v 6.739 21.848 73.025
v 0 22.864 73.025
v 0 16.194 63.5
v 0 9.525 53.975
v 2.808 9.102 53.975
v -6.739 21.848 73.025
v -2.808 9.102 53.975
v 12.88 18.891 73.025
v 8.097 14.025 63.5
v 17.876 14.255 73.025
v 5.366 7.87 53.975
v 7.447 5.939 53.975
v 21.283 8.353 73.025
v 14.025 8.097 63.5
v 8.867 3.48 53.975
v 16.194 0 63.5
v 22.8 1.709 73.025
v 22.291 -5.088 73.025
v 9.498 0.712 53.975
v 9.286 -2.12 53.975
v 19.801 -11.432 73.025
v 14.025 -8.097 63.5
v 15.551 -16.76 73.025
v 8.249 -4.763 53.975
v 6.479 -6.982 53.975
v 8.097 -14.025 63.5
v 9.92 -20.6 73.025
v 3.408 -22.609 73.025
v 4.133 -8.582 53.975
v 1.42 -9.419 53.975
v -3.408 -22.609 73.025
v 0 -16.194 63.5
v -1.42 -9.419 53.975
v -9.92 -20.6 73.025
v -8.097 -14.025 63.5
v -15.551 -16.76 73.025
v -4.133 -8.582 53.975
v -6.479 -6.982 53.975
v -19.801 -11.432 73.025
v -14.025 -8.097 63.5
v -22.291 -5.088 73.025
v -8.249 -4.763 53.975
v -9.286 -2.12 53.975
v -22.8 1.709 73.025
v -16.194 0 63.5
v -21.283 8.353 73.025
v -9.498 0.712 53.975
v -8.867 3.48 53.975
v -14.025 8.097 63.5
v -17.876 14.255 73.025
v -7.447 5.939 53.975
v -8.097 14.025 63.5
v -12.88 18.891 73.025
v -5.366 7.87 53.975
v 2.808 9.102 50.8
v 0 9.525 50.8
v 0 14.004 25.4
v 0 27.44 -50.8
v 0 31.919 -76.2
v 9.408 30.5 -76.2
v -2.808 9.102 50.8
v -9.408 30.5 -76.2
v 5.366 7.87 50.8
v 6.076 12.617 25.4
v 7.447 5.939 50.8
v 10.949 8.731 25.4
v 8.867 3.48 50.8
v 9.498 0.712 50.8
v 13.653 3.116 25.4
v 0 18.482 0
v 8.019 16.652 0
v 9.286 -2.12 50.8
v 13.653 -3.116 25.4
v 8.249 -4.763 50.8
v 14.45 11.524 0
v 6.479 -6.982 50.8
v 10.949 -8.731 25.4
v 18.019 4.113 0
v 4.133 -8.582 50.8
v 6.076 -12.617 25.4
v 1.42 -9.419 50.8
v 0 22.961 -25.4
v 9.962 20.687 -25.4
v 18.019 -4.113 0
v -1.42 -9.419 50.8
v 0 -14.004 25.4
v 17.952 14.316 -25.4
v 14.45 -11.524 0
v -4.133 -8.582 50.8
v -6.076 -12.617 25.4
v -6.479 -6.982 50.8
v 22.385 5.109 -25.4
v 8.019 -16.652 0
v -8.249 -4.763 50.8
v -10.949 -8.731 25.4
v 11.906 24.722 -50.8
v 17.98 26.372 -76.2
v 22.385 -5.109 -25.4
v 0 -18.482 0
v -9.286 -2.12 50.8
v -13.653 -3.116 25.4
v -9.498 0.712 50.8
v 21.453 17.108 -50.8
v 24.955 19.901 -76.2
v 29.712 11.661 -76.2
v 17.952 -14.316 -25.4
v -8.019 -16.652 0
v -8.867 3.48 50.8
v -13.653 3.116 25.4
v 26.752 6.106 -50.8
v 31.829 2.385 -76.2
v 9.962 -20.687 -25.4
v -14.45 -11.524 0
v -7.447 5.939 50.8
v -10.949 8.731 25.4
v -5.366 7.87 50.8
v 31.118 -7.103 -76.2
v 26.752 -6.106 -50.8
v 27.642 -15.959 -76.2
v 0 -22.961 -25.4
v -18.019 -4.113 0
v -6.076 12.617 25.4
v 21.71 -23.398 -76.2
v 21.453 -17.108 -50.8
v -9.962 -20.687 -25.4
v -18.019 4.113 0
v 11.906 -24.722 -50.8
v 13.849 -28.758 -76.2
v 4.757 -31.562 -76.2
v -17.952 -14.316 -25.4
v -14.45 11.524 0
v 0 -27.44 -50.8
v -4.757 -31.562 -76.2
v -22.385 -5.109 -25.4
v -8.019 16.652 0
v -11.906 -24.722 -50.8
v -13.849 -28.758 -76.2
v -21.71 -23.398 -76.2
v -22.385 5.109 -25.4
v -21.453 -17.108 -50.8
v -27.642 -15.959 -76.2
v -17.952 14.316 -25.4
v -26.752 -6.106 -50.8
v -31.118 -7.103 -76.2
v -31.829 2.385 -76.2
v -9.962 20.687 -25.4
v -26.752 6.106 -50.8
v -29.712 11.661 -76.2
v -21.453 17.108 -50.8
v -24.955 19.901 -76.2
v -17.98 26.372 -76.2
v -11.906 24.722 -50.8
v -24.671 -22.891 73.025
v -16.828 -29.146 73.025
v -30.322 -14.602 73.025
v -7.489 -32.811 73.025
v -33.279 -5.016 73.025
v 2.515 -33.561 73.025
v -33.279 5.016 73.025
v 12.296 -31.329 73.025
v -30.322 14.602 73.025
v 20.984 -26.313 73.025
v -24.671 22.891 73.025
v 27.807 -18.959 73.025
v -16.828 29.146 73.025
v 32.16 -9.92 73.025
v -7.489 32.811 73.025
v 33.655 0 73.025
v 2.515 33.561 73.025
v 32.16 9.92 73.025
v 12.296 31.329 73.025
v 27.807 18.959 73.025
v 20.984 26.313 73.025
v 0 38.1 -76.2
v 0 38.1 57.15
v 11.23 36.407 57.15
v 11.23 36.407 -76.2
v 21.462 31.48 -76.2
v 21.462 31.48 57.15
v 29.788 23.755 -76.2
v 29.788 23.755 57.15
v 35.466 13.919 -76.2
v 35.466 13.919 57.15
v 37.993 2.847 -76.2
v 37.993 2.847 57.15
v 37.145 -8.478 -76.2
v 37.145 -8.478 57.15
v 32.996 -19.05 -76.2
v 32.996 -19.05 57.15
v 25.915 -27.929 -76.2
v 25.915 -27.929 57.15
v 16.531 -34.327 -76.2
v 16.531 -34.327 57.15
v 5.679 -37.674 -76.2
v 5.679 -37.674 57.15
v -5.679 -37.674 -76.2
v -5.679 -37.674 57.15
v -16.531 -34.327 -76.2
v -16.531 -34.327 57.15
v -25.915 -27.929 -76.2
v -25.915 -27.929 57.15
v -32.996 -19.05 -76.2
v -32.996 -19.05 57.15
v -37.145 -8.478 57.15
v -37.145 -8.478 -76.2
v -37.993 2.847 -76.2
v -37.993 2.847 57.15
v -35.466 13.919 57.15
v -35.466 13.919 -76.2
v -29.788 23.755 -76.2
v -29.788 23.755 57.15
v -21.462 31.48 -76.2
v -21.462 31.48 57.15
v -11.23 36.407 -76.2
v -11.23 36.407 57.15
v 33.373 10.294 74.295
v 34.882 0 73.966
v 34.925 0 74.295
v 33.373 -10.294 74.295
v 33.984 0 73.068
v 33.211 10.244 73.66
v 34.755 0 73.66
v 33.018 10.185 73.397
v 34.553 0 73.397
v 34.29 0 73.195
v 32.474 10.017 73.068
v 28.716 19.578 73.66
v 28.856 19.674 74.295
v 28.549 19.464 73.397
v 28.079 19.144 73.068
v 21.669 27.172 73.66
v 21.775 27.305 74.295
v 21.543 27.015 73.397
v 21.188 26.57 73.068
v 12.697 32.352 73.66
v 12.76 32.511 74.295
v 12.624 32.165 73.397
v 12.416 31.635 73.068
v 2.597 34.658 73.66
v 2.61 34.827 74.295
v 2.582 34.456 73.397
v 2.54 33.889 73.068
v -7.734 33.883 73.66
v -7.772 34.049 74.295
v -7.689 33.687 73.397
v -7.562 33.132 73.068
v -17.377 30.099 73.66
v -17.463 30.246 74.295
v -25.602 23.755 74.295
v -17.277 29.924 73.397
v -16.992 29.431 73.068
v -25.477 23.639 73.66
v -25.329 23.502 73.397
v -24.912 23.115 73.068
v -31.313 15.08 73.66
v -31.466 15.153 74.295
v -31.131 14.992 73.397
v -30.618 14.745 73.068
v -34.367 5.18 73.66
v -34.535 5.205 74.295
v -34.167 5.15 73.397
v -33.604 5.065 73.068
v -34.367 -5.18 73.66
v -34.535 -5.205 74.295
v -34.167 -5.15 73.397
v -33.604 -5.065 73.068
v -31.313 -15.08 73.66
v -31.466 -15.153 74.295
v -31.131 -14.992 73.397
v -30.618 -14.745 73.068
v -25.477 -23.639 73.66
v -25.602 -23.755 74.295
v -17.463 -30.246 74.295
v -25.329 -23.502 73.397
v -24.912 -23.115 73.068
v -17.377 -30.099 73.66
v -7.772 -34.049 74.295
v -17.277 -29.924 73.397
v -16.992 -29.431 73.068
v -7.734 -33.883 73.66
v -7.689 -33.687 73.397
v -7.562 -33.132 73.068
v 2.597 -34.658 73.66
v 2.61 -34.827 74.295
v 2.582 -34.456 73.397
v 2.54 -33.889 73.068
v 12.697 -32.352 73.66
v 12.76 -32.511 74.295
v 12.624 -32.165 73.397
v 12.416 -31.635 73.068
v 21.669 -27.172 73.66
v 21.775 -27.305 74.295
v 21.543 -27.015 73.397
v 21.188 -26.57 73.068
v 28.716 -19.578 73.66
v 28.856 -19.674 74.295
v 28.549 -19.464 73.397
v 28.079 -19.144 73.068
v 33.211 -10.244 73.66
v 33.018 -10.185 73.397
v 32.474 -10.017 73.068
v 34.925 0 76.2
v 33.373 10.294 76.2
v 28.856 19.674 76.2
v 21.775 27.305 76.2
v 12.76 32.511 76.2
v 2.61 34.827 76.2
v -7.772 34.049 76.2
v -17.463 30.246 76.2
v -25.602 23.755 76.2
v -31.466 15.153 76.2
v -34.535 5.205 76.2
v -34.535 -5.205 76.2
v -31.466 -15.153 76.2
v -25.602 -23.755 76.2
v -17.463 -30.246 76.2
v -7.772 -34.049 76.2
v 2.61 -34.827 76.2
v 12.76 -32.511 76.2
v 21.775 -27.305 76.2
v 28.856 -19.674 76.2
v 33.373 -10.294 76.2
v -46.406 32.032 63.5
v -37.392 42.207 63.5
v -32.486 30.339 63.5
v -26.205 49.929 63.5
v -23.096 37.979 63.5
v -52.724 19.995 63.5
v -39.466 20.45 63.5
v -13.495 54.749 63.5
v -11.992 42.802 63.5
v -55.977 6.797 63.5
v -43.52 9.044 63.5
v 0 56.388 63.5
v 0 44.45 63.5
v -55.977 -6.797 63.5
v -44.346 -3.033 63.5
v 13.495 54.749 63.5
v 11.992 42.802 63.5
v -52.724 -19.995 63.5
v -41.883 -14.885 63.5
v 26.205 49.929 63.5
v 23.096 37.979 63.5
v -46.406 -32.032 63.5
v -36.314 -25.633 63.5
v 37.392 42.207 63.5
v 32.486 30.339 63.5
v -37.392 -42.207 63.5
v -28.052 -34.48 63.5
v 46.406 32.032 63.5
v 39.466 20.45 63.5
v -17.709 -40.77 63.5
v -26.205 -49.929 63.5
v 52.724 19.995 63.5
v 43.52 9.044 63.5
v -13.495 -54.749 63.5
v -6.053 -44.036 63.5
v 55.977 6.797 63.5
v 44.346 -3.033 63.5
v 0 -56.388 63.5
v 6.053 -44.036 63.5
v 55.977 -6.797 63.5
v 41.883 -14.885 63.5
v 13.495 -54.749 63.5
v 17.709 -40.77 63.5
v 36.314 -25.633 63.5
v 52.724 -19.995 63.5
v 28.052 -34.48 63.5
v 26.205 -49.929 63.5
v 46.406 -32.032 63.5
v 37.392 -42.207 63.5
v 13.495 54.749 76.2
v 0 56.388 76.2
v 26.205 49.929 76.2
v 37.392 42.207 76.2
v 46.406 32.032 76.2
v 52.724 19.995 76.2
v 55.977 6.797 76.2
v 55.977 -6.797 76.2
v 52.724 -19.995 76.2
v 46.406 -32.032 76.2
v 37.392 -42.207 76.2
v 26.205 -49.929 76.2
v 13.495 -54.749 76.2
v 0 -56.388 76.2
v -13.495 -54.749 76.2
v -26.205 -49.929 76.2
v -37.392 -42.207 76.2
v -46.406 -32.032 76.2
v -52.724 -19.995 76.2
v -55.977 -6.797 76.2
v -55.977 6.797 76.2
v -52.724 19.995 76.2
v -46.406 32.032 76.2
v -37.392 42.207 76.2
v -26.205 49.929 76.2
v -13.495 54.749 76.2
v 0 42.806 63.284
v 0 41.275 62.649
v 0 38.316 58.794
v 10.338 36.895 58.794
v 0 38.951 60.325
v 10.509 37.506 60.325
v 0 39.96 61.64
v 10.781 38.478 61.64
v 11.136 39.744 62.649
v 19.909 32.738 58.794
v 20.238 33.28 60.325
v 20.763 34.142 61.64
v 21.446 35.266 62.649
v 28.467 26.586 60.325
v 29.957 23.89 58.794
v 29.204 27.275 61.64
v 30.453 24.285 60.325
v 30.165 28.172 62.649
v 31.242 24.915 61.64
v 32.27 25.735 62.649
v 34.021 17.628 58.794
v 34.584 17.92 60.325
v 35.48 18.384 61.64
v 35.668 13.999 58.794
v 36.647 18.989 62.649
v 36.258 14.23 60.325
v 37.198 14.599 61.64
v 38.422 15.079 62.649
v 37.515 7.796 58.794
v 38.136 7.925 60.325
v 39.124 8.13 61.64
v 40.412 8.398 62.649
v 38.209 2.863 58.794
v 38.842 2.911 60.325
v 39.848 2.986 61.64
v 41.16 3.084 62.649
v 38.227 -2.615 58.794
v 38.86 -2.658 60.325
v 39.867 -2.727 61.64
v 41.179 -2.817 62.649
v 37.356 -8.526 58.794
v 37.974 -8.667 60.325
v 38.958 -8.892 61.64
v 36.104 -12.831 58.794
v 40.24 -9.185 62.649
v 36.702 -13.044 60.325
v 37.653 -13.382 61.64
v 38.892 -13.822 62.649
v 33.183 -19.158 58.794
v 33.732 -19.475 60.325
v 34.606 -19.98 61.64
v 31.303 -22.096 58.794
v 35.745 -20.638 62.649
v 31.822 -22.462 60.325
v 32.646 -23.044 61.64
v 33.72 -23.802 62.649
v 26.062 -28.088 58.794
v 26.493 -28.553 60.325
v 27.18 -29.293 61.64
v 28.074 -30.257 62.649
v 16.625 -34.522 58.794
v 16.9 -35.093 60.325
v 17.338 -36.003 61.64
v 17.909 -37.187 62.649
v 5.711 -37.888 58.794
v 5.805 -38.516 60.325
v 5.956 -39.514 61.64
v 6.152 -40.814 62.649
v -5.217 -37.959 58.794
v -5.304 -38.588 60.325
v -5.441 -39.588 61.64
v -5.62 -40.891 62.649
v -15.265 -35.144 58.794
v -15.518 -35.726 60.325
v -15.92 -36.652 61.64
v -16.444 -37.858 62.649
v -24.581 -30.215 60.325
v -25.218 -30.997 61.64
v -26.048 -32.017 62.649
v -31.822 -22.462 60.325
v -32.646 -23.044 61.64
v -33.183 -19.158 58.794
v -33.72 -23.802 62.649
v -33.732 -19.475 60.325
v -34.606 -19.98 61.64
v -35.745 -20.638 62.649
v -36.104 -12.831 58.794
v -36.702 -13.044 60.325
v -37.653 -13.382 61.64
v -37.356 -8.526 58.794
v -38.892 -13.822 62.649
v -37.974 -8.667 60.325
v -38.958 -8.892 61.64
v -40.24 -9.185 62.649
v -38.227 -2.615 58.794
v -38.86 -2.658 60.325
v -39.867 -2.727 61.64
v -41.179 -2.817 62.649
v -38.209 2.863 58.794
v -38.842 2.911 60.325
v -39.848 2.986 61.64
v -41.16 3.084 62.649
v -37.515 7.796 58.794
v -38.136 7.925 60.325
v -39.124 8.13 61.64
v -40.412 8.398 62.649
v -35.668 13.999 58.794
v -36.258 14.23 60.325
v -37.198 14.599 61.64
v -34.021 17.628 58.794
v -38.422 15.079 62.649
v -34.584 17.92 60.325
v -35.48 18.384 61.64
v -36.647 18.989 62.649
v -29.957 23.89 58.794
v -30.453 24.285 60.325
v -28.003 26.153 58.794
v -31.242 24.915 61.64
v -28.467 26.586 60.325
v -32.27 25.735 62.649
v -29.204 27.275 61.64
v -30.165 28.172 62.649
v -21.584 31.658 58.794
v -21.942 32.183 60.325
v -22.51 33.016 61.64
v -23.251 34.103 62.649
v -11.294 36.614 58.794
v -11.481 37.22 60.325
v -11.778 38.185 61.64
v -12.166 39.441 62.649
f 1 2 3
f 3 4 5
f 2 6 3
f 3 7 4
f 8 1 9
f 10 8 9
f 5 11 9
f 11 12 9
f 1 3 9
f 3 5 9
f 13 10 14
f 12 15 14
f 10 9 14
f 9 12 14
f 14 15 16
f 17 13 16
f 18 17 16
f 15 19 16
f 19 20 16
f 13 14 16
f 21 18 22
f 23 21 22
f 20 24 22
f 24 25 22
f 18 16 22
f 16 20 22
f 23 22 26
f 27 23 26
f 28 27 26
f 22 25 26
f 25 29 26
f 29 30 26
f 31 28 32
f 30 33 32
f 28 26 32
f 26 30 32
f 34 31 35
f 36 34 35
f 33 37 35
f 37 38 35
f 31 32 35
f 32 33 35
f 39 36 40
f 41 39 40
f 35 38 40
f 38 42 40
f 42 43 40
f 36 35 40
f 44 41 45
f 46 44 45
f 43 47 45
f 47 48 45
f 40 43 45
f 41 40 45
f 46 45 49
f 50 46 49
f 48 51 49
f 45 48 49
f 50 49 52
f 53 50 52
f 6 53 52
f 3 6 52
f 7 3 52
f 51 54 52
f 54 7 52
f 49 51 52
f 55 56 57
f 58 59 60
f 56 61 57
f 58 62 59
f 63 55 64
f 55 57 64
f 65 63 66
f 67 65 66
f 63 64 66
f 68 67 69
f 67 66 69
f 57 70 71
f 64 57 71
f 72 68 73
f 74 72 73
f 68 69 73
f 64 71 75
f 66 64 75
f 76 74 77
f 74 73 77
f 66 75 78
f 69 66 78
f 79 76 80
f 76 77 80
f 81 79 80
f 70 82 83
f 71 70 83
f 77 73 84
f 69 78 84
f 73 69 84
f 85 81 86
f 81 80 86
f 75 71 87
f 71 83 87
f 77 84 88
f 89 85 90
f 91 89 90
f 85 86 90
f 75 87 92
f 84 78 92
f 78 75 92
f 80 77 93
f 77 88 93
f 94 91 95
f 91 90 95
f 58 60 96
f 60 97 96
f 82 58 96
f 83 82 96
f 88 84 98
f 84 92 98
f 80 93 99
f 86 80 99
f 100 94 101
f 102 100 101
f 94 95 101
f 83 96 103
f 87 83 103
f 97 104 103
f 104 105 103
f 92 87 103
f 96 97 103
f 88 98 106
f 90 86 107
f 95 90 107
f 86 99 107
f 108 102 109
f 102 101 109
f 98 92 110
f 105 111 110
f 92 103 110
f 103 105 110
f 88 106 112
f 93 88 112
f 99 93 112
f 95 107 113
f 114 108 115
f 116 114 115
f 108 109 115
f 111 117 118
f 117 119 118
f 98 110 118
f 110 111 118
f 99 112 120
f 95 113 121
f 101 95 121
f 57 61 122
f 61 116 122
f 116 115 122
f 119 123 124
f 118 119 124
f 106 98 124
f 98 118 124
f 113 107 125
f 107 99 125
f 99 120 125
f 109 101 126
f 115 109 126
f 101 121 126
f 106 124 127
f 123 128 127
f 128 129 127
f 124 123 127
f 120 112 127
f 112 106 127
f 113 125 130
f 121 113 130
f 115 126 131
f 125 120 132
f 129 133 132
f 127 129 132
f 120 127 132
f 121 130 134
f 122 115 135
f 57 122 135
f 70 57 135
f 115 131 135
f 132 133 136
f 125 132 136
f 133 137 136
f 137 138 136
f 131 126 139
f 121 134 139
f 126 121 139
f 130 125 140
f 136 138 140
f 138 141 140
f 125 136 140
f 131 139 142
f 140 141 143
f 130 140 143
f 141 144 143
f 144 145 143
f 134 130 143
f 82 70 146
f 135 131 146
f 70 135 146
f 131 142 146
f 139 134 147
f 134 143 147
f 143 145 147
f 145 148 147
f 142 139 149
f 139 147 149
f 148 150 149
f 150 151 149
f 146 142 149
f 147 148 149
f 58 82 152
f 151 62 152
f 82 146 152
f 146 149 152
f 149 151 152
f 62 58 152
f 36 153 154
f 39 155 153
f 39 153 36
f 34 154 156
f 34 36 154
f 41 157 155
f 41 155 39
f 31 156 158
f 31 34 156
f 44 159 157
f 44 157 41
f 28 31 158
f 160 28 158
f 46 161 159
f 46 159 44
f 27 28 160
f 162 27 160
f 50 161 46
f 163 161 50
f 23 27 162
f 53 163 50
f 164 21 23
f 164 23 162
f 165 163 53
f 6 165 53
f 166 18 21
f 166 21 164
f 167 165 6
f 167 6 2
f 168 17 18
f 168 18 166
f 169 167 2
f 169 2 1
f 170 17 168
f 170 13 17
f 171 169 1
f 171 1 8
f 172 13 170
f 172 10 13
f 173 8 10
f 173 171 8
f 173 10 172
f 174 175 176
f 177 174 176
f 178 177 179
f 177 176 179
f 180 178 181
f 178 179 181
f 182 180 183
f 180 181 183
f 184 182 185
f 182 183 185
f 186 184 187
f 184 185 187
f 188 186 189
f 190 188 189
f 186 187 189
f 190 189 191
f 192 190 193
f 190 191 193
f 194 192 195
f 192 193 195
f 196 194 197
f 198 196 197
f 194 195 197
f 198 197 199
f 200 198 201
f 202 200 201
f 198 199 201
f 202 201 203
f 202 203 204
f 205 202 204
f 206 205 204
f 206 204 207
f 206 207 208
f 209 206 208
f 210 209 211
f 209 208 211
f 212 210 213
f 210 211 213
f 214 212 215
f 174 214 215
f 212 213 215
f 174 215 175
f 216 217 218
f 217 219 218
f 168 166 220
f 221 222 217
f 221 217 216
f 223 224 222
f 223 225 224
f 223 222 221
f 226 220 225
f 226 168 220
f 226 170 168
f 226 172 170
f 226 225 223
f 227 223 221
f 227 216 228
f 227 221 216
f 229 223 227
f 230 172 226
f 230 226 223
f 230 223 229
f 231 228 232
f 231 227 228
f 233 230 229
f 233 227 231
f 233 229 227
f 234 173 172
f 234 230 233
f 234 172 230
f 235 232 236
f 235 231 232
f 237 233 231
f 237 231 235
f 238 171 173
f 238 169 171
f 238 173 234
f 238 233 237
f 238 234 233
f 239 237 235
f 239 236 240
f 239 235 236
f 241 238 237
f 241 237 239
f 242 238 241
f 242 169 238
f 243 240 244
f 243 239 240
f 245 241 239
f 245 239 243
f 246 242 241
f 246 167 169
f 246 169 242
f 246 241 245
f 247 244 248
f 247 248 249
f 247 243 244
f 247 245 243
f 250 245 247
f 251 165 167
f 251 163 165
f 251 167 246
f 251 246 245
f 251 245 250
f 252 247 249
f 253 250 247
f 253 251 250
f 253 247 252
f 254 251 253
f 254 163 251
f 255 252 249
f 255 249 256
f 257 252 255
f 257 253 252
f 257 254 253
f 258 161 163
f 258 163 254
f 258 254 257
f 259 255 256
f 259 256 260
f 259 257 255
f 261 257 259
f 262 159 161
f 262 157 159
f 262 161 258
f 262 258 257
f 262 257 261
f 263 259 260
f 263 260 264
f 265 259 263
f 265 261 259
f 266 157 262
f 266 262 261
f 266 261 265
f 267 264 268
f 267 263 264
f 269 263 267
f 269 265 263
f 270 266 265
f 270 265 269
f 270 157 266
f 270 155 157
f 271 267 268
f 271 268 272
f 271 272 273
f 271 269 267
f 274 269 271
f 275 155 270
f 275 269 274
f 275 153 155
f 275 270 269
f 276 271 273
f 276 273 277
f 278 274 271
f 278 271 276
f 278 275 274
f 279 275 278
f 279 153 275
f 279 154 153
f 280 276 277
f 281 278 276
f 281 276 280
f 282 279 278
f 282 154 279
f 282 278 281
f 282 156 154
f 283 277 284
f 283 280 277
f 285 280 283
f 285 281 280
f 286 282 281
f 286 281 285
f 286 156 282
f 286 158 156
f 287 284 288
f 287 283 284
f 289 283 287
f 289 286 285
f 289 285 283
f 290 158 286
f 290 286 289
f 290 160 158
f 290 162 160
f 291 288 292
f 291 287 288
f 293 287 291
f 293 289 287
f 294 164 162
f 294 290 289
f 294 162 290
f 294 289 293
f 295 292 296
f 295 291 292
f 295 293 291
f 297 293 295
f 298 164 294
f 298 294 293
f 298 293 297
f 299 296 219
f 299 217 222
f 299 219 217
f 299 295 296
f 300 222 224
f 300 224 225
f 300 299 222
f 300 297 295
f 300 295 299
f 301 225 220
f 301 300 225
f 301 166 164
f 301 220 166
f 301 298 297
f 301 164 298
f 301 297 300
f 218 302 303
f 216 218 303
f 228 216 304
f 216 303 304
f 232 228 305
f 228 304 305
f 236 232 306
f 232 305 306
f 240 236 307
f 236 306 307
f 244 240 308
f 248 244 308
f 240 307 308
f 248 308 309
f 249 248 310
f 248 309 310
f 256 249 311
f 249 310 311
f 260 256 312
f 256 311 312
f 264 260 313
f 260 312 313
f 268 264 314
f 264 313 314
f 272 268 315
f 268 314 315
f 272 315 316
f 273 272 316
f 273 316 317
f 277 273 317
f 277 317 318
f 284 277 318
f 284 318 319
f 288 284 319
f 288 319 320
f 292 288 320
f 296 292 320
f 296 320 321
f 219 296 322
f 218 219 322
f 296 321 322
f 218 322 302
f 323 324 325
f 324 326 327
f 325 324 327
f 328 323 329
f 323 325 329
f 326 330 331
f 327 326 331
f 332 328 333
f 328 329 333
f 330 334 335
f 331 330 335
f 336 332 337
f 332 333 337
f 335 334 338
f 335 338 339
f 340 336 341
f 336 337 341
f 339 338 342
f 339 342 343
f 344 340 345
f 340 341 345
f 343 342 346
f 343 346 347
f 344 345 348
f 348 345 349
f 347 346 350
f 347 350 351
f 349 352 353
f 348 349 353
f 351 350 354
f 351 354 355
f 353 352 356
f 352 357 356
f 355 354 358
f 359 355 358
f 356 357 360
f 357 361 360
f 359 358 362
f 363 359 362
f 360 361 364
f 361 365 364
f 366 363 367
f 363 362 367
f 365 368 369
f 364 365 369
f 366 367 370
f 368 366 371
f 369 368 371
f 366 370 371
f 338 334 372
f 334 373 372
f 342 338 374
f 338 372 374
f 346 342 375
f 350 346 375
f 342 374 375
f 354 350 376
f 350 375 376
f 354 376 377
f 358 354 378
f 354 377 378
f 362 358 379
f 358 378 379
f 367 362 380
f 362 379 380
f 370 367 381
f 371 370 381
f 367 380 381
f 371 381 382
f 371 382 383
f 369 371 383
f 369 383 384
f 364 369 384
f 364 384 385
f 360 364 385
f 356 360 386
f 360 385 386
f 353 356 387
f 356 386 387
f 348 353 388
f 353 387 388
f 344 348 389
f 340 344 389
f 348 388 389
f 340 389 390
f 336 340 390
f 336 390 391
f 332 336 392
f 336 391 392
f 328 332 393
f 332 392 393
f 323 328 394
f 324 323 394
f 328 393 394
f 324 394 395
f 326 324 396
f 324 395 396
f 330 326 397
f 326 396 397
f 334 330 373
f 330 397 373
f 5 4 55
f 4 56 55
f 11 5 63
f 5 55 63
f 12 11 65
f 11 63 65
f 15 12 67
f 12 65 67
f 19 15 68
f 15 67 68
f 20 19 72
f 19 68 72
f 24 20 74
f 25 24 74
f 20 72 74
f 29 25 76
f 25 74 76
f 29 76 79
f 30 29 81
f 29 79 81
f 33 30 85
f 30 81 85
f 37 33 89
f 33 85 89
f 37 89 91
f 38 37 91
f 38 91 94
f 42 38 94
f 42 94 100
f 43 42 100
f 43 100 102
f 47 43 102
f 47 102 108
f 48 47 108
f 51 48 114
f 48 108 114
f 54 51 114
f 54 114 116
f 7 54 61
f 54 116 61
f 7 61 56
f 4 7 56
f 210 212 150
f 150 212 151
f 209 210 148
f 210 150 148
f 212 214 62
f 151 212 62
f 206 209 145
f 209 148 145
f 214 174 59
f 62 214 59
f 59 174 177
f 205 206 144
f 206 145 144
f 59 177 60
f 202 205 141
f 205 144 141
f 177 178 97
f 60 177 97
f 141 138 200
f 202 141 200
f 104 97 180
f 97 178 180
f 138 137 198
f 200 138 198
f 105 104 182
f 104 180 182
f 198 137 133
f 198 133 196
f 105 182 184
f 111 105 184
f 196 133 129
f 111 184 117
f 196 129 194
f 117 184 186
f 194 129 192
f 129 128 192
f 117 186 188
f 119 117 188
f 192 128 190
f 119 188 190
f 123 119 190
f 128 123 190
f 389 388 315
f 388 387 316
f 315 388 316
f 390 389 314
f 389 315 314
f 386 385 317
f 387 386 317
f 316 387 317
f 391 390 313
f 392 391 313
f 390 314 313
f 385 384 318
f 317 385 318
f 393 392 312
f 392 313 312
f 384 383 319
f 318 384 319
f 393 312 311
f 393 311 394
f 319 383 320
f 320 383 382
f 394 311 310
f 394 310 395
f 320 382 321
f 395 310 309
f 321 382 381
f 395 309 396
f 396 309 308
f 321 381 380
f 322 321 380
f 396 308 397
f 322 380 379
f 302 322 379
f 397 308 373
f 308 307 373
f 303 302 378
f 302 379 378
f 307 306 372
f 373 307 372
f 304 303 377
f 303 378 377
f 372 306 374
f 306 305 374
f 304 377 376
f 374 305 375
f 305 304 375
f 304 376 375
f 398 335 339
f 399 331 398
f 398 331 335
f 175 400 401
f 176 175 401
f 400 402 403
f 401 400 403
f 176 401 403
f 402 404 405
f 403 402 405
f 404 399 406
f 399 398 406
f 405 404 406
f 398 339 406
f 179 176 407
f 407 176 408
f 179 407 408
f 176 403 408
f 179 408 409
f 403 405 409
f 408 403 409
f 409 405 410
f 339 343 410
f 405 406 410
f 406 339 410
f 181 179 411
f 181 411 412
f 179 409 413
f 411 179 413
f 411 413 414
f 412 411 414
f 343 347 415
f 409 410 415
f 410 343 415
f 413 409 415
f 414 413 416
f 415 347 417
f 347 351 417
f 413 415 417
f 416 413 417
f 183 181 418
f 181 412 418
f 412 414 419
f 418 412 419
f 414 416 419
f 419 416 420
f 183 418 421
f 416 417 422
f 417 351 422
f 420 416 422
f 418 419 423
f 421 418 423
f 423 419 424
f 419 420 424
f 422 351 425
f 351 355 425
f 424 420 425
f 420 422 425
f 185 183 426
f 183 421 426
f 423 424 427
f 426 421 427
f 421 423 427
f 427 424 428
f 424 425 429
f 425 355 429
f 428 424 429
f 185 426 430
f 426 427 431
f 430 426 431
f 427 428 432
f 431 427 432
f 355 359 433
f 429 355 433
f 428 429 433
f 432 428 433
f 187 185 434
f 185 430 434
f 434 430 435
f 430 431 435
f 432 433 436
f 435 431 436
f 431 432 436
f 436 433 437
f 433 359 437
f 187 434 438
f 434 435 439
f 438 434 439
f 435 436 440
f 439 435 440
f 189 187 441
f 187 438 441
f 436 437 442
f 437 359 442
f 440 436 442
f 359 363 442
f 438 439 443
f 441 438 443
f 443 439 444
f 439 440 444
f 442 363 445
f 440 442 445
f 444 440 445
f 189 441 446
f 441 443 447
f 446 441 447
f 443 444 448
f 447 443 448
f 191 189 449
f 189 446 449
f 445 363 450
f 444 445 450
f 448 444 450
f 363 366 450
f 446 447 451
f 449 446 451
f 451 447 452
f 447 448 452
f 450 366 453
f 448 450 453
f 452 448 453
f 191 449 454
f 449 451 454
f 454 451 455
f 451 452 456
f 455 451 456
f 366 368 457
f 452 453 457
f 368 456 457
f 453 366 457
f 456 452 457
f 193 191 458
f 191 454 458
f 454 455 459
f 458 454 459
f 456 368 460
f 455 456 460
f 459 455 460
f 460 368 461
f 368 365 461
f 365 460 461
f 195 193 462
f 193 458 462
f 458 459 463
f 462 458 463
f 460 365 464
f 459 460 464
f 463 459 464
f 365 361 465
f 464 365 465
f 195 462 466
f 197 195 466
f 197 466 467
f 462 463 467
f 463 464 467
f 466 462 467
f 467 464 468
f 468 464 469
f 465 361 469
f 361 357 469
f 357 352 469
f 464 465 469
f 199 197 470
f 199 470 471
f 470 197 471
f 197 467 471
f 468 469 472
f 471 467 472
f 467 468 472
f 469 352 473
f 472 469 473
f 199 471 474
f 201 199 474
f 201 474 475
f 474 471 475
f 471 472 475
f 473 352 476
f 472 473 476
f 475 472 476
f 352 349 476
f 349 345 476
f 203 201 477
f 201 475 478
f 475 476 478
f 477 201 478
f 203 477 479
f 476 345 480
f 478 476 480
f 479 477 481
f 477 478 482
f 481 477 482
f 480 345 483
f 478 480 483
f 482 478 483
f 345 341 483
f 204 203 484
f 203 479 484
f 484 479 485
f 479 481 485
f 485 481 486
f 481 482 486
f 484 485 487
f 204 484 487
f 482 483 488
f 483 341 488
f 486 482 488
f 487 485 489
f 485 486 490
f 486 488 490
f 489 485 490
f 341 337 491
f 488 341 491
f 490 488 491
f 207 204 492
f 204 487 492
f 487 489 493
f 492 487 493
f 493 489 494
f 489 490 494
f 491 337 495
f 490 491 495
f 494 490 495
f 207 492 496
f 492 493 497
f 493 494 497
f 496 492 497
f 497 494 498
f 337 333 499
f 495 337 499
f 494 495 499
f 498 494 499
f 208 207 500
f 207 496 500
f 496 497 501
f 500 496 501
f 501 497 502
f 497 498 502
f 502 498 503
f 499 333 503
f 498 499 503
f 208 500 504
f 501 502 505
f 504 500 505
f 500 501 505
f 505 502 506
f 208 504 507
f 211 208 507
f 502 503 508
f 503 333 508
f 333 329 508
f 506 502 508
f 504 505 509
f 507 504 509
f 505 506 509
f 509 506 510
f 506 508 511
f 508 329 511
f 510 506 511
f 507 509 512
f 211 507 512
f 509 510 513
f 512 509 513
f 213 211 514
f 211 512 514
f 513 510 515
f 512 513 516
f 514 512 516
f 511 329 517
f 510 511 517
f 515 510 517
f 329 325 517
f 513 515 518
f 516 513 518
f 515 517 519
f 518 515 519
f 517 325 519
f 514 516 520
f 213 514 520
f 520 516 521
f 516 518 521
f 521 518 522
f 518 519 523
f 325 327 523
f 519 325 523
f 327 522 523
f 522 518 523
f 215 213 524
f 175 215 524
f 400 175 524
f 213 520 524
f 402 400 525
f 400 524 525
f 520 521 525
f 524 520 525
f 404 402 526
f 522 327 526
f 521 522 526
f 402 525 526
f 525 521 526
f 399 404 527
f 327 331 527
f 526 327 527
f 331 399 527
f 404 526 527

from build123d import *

# Parameters (mm, degrees)
FILLET1_R          = 6.35
SKETCH2_R          = 34.925
CUT_EXTRUDE1_DEPTH = 3.175
FILLET2_R          = 1.27


with BuildPart() as part:
    # Sketch1 → Revolve1 (revolve)
    with BuildSketch(Plane(origin=(0, 0, 0), x_dir=(0, 0, -1), z_dir=(1, 0, 0))):
        Polygon((-76.2, 25.087112537), (-53.975, 9.525), (-50.8, 9.525), (76.2, 31.91852655), (76.2, 38.1), (-63.5, 38.1), (-63.5, 56.388), (-76.2, 56.388), align=None)
    revolve(axis=Axis((0, 0, 76.2), (0, 0, -1)))

    # Fillet1
    fillet1_edges = [part.edges().sort_by_distance(p)[0] for p in [
        (0, -38.1, 63.5),
    ]]
    fillet(fillet1_edges, radius=FILLET1_R)

    # Sketch2 → Cut-Extrude1 (cut)
    with BuildSketch(Plane.XY.offset(76.2)):
        Circle(SKETCH2_R)
    extrude(amount=-CUT_EXTRUDE1_DEPTH, mode=Mode.SUBTRACT)

    # Fillet2
    fillet2_edges = [part.edges().sort_by_distance(p)[0] for p in [
        (-34.925, 0, 73.025),
    ]]
    fillet(fillet2_edges, radius=FILLET2_R)


solid = part.part
